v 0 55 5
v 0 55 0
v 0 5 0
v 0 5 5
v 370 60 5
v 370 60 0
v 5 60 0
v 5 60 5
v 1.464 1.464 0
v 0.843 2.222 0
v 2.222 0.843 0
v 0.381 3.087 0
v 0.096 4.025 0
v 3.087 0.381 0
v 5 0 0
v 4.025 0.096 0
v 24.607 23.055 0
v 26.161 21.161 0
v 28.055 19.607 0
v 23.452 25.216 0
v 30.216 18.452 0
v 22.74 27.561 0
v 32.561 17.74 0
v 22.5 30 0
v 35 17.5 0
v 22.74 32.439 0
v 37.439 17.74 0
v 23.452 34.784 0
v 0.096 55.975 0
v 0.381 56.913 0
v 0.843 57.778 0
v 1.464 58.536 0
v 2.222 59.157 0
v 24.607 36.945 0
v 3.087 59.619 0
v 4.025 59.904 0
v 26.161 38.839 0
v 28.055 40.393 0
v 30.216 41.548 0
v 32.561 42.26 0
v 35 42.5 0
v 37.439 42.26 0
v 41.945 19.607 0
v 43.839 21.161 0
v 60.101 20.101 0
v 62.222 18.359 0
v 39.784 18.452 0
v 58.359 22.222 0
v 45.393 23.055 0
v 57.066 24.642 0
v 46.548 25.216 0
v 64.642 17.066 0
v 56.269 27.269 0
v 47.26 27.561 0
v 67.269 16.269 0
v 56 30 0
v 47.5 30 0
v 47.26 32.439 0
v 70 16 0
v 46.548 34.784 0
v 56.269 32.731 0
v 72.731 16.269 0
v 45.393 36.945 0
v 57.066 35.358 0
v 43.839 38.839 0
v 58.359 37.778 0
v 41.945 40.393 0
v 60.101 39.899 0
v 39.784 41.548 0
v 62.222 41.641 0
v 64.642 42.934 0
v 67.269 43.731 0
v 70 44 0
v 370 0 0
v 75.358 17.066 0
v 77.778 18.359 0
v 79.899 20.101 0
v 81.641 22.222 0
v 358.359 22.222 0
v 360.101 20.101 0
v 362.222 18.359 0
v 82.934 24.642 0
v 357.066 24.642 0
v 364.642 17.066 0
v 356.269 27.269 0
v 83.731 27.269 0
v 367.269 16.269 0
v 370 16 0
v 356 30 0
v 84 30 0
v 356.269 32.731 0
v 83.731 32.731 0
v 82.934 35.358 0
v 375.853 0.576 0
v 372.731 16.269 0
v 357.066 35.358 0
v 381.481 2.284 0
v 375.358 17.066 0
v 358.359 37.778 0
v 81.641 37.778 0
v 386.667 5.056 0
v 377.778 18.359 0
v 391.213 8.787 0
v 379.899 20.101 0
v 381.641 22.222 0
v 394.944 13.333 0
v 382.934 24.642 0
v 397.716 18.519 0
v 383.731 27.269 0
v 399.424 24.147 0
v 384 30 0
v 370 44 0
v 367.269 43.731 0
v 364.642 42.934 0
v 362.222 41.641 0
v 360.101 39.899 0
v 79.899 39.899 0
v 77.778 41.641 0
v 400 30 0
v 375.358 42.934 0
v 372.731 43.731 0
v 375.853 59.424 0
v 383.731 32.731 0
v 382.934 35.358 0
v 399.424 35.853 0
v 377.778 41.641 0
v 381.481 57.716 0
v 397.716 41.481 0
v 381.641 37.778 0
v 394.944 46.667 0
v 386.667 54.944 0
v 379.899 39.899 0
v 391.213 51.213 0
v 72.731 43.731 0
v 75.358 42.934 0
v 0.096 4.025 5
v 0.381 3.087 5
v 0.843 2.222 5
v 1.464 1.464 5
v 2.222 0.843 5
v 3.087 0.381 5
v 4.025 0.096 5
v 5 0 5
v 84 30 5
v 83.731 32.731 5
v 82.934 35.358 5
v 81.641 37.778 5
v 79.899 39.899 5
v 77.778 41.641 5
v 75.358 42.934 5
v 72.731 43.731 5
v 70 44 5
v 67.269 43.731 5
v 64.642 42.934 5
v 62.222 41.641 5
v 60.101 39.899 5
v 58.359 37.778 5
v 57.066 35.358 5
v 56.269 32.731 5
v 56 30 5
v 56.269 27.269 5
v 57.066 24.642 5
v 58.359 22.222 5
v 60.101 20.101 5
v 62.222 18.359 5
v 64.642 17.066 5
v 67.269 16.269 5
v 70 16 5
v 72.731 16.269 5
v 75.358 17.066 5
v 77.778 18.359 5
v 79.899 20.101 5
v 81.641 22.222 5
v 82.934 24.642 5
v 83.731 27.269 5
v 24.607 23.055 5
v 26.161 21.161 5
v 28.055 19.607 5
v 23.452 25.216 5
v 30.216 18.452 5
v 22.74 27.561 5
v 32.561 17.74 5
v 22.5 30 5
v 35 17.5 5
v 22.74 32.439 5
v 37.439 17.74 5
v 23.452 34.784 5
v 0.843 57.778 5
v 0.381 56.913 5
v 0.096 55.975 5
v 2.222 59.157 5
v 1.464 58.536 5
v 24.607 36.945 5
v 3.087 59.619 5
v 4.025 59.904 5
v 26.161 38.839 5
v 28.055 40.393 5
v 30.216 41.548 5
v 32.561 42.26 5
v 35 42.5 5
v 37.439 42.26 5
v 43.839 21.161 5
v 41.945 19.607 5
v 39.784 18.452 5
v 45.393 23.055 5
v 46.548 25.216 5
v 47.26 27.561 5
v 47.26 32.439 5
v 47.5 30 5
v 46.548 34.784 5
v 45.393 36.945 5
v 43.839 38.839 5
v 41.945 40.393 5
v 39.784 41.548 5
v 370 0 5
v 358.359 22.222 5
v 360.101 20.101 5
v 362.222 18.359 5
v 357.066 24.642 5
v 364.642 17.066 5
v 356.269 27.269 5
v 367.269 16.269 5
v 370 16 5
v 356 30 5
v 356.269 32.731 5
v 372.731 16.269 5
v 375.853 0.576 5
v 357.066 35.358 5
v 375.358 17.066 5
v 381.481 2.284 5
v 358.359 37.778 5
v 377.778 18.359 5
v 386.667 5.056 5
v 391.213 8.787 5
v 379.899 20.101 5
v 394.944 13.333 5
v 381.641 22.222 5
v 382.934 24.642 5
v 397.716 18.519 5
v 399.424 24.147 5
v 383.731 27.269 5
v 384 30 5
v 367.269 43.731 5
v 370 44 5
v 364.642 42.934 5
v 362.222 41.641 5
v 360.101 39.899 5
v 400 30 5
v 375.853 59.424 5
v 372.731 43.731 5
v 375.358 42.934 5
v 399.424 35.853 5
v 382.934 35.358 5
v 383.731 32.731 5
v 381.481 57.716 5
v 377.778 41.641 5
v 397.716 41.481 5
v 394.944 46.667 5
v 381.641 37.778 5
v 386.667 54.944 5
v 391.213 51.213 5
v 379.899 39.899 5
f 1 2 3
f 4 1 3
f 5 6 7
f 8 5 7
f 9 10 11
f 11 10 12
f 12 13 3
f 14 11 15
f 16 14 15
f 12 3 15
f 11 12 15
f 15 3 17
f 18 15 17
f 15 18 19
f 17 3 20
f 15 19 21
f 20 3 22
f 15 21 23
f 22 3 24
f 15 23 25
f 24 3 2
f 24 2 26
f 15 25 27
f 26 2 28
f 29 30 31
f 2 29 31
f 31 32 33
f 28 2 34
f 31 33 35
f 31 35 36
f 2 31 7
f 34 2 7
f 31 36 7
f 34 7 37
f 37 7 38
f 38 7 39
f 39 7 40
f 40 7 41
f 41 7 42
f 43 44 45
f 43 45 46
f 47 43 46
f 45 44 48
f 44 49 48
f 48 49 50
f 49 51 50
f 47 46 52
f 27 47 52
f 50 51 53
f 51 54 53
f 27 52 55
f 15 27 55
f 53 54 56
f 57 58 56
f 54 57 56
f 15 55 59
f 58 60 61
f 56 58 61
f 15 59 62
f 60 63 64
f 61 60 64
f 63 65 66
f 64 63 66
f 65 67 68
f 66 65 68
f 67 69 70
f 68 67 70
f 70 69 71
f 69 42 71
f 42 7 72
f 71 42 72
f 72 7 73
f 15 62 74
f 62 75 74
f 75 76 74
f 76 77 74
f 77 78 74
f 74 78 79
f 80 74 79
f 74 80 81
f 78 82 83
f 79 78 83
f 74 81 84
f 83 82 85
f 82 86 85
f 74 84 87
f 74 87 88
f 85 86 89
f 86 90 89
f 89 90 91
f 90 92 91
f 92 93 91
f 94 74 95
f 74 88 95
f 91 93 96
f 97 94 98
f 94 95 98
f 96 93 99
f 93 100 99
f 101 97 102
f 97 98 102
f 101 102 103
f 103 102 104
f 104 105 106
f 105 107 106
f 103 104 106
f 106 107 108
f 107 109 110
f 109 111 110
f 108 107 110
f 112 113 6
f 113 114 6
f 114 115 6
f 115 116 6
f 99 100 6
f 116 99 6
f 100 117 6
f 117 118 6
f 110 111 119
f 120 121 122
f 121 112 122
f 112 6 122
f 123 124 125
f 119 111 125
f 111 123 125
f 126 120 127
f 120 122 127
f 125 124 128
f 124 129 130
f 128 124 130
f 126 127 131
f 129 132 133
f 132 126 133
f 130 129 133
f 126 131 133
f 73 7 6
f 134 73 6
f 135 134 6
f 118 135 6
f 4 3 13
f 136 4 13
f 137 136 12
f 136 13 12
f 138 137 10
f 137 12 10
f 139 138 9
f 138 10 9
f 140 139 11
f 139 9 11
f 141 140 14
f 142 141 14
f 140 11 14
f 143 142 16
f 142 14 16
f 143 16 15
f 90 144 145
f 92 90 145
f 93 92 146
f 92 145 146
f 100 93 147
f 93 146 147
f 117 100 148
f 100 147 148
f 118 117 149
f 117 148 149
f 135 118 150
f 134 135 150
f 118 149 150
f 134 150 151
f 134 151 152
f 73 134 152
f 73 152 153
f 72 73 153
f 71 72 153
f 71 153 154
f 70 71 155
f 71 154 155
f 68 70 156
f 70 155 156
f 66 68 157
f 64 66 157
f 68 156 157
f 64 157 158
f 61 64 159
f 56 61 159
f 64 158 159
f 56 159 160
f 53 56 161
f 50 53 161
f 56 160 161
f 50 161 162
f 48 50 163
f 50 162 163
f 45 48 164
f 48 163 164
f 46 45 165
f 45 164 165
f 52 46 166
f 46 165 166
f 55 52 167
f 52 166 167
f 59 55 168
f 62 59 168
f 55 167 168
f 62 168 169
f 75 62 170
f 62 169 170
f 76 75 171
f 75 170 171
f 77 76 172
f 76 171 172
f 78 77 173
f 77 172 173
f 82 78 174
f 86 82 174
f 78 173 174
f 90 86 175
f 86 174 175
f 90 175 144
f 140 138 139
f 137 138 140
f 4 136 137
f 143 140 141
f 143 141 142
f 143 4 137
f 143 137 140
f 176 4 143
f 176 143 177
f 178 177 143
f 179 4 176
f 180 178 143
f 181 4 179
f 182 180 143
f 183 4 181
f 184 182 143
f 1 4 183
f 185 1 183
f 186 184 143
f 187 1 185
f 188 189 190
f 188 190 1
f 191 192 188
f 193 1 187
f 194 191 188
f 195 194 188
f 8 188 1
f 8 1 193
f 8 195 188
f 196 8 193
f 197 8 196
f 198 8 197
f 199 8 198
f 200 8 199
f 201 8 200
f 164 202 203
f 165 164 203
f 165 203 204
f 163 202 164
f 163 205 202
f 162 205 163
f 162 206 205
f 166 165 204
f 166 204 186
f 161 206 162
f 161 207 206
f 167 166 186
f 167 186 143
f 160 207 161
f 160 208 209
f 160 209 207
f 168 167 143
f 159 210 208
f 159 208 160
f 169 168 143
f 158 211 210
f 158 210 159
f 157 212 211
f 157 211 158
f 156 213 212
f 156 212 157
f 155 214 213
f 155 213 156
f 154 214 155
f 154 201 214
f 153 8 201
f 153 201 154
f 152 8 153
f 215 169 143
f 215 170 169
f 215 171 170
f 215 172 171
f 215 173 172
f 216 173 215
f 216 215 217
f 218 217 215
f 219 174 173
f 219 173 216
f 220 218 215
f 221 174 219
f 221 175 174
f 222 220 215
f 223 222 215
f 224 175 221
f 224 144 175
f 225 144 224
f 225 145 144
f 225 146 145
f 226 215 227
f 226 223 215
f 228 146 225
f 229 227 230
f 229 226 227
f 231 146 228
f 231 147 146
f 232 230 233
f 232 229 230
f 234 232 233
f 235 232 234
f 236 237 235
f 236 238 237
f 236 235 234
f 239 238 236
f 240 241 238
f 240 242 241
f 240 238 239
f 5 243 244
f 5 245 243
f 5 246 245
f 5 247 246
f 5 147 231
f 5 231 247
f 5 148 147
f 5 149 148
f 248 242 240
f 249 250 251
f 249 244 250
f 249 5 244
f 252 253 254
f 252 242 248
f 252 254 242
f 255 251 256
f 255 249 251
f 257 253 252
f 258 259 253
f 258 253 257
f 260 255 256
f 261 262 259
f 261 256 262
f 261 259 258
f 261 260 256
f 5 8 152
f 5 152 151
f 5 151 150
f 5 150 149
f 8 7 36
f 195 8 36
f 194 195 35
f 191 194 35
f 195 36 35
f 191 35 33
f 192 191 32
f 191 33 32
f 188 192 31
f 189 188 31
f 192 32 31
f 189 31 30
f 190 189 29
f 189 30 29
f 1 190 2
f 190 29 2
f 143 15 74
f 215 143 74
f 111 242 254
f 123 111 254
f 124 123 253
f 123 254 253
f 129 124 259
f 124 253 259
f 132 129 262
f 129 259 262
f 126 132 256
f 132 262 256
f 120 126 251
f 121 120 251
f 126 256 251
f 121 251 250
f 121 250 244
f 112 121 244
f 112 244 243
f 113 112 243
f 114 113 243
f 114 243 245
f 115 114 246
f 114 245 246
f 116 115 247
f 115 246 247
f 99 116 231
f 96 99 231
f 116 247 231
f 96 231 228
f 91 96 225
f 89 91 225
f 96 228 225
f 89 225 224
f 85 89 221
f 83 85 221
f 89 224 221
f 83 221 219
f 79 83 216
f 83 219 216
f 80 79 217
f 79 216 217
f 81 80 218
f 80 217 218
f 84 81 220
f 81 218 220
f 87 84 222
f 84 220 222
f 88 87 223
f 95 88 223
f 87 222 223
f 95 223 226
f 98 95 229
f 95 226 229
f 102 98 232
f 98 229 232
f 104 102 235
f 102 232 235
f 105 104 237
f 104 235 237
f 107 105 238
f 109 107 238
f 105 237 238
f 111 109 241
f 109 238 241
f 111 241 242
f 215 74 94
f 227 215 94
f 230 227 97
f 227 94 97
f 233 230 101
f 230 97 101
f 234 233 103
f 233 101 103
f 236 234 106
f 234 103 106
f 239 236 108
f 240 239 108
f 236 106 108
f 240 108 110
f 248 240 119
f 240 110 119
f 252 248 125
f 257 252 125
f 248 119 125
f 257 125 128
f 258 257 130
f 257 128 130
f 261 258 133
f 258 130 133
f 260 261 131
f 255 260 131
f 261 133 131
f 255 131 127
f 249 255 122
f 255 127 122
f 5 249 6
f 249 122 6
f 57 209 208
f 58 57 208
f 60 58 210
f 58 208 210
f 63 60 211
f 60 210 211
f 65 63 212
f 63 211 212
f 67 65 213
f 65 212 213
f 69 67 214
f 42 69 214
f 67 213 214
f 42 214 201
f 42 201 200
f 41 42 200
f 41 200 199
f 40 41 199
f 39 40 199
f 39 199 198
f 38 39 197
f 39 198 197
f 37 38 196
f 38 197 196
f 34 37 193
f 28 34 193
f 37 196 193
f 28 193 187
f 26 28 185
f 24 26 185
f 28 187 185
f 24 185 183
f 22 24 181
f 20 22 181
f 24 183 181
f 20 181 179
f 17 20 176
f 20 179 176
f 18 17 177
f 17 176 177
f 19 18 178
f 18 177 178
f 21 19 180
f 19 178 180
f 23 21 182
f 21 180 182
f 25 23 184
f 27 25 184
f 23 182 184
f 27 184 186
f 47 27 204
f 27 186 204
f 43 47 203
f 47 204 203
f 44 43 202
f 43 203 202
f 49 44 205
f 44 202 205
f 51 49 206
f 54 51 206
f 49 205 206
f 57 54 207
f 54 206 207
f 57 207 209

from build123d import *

# Parameters (mm, degrees)
SALIENTE_EXTRUIR1_DEPTH = 5
CROQUIS2_R              = 14
CROQUIS2_R_2            = 12.5
CORTAR_EXTRUIR1_DEPTH   = 5


with BuildPart() as part:
    # Croquis1 → Saliente-Extruir1 (new body)
    with BuildSketch(Plane.XY):
        with BuildLine():
            Line((5, 0), (370, 0))
            ThreePointArc((370, 0), (400, 30), (370, 60))
            Line((370, 60), (5, 60))
            ThreePointArc((5, 60), (1.464466094, 58.535533906), (0, 55))
            Line((0, 55), (0, 5))
            ThreePointArc((0, 5), (1.464466094, 1.464466094), (5, 0))
        make_face()
    extrude(amount=SALIENTE_EXTRUIR1_DEPTH)

    # Croquis2 → Cortar-Extruir1 (cut)
    with BuildSketch(Plane.XY.offset(5)):
        with Locations((370, 30)):
            Circle(CROQUIS2_R)
        with Locations((35, 30)):
            Circle(CROQUIS2_R_2)
        with Locations((70, 30)):
            Circle(CROQUIS2_R)
    extrude(amount=-CORTAR_EXTRUIR1_DEPTH, mode=Mode.SUBTRACT)


solid = part.part
